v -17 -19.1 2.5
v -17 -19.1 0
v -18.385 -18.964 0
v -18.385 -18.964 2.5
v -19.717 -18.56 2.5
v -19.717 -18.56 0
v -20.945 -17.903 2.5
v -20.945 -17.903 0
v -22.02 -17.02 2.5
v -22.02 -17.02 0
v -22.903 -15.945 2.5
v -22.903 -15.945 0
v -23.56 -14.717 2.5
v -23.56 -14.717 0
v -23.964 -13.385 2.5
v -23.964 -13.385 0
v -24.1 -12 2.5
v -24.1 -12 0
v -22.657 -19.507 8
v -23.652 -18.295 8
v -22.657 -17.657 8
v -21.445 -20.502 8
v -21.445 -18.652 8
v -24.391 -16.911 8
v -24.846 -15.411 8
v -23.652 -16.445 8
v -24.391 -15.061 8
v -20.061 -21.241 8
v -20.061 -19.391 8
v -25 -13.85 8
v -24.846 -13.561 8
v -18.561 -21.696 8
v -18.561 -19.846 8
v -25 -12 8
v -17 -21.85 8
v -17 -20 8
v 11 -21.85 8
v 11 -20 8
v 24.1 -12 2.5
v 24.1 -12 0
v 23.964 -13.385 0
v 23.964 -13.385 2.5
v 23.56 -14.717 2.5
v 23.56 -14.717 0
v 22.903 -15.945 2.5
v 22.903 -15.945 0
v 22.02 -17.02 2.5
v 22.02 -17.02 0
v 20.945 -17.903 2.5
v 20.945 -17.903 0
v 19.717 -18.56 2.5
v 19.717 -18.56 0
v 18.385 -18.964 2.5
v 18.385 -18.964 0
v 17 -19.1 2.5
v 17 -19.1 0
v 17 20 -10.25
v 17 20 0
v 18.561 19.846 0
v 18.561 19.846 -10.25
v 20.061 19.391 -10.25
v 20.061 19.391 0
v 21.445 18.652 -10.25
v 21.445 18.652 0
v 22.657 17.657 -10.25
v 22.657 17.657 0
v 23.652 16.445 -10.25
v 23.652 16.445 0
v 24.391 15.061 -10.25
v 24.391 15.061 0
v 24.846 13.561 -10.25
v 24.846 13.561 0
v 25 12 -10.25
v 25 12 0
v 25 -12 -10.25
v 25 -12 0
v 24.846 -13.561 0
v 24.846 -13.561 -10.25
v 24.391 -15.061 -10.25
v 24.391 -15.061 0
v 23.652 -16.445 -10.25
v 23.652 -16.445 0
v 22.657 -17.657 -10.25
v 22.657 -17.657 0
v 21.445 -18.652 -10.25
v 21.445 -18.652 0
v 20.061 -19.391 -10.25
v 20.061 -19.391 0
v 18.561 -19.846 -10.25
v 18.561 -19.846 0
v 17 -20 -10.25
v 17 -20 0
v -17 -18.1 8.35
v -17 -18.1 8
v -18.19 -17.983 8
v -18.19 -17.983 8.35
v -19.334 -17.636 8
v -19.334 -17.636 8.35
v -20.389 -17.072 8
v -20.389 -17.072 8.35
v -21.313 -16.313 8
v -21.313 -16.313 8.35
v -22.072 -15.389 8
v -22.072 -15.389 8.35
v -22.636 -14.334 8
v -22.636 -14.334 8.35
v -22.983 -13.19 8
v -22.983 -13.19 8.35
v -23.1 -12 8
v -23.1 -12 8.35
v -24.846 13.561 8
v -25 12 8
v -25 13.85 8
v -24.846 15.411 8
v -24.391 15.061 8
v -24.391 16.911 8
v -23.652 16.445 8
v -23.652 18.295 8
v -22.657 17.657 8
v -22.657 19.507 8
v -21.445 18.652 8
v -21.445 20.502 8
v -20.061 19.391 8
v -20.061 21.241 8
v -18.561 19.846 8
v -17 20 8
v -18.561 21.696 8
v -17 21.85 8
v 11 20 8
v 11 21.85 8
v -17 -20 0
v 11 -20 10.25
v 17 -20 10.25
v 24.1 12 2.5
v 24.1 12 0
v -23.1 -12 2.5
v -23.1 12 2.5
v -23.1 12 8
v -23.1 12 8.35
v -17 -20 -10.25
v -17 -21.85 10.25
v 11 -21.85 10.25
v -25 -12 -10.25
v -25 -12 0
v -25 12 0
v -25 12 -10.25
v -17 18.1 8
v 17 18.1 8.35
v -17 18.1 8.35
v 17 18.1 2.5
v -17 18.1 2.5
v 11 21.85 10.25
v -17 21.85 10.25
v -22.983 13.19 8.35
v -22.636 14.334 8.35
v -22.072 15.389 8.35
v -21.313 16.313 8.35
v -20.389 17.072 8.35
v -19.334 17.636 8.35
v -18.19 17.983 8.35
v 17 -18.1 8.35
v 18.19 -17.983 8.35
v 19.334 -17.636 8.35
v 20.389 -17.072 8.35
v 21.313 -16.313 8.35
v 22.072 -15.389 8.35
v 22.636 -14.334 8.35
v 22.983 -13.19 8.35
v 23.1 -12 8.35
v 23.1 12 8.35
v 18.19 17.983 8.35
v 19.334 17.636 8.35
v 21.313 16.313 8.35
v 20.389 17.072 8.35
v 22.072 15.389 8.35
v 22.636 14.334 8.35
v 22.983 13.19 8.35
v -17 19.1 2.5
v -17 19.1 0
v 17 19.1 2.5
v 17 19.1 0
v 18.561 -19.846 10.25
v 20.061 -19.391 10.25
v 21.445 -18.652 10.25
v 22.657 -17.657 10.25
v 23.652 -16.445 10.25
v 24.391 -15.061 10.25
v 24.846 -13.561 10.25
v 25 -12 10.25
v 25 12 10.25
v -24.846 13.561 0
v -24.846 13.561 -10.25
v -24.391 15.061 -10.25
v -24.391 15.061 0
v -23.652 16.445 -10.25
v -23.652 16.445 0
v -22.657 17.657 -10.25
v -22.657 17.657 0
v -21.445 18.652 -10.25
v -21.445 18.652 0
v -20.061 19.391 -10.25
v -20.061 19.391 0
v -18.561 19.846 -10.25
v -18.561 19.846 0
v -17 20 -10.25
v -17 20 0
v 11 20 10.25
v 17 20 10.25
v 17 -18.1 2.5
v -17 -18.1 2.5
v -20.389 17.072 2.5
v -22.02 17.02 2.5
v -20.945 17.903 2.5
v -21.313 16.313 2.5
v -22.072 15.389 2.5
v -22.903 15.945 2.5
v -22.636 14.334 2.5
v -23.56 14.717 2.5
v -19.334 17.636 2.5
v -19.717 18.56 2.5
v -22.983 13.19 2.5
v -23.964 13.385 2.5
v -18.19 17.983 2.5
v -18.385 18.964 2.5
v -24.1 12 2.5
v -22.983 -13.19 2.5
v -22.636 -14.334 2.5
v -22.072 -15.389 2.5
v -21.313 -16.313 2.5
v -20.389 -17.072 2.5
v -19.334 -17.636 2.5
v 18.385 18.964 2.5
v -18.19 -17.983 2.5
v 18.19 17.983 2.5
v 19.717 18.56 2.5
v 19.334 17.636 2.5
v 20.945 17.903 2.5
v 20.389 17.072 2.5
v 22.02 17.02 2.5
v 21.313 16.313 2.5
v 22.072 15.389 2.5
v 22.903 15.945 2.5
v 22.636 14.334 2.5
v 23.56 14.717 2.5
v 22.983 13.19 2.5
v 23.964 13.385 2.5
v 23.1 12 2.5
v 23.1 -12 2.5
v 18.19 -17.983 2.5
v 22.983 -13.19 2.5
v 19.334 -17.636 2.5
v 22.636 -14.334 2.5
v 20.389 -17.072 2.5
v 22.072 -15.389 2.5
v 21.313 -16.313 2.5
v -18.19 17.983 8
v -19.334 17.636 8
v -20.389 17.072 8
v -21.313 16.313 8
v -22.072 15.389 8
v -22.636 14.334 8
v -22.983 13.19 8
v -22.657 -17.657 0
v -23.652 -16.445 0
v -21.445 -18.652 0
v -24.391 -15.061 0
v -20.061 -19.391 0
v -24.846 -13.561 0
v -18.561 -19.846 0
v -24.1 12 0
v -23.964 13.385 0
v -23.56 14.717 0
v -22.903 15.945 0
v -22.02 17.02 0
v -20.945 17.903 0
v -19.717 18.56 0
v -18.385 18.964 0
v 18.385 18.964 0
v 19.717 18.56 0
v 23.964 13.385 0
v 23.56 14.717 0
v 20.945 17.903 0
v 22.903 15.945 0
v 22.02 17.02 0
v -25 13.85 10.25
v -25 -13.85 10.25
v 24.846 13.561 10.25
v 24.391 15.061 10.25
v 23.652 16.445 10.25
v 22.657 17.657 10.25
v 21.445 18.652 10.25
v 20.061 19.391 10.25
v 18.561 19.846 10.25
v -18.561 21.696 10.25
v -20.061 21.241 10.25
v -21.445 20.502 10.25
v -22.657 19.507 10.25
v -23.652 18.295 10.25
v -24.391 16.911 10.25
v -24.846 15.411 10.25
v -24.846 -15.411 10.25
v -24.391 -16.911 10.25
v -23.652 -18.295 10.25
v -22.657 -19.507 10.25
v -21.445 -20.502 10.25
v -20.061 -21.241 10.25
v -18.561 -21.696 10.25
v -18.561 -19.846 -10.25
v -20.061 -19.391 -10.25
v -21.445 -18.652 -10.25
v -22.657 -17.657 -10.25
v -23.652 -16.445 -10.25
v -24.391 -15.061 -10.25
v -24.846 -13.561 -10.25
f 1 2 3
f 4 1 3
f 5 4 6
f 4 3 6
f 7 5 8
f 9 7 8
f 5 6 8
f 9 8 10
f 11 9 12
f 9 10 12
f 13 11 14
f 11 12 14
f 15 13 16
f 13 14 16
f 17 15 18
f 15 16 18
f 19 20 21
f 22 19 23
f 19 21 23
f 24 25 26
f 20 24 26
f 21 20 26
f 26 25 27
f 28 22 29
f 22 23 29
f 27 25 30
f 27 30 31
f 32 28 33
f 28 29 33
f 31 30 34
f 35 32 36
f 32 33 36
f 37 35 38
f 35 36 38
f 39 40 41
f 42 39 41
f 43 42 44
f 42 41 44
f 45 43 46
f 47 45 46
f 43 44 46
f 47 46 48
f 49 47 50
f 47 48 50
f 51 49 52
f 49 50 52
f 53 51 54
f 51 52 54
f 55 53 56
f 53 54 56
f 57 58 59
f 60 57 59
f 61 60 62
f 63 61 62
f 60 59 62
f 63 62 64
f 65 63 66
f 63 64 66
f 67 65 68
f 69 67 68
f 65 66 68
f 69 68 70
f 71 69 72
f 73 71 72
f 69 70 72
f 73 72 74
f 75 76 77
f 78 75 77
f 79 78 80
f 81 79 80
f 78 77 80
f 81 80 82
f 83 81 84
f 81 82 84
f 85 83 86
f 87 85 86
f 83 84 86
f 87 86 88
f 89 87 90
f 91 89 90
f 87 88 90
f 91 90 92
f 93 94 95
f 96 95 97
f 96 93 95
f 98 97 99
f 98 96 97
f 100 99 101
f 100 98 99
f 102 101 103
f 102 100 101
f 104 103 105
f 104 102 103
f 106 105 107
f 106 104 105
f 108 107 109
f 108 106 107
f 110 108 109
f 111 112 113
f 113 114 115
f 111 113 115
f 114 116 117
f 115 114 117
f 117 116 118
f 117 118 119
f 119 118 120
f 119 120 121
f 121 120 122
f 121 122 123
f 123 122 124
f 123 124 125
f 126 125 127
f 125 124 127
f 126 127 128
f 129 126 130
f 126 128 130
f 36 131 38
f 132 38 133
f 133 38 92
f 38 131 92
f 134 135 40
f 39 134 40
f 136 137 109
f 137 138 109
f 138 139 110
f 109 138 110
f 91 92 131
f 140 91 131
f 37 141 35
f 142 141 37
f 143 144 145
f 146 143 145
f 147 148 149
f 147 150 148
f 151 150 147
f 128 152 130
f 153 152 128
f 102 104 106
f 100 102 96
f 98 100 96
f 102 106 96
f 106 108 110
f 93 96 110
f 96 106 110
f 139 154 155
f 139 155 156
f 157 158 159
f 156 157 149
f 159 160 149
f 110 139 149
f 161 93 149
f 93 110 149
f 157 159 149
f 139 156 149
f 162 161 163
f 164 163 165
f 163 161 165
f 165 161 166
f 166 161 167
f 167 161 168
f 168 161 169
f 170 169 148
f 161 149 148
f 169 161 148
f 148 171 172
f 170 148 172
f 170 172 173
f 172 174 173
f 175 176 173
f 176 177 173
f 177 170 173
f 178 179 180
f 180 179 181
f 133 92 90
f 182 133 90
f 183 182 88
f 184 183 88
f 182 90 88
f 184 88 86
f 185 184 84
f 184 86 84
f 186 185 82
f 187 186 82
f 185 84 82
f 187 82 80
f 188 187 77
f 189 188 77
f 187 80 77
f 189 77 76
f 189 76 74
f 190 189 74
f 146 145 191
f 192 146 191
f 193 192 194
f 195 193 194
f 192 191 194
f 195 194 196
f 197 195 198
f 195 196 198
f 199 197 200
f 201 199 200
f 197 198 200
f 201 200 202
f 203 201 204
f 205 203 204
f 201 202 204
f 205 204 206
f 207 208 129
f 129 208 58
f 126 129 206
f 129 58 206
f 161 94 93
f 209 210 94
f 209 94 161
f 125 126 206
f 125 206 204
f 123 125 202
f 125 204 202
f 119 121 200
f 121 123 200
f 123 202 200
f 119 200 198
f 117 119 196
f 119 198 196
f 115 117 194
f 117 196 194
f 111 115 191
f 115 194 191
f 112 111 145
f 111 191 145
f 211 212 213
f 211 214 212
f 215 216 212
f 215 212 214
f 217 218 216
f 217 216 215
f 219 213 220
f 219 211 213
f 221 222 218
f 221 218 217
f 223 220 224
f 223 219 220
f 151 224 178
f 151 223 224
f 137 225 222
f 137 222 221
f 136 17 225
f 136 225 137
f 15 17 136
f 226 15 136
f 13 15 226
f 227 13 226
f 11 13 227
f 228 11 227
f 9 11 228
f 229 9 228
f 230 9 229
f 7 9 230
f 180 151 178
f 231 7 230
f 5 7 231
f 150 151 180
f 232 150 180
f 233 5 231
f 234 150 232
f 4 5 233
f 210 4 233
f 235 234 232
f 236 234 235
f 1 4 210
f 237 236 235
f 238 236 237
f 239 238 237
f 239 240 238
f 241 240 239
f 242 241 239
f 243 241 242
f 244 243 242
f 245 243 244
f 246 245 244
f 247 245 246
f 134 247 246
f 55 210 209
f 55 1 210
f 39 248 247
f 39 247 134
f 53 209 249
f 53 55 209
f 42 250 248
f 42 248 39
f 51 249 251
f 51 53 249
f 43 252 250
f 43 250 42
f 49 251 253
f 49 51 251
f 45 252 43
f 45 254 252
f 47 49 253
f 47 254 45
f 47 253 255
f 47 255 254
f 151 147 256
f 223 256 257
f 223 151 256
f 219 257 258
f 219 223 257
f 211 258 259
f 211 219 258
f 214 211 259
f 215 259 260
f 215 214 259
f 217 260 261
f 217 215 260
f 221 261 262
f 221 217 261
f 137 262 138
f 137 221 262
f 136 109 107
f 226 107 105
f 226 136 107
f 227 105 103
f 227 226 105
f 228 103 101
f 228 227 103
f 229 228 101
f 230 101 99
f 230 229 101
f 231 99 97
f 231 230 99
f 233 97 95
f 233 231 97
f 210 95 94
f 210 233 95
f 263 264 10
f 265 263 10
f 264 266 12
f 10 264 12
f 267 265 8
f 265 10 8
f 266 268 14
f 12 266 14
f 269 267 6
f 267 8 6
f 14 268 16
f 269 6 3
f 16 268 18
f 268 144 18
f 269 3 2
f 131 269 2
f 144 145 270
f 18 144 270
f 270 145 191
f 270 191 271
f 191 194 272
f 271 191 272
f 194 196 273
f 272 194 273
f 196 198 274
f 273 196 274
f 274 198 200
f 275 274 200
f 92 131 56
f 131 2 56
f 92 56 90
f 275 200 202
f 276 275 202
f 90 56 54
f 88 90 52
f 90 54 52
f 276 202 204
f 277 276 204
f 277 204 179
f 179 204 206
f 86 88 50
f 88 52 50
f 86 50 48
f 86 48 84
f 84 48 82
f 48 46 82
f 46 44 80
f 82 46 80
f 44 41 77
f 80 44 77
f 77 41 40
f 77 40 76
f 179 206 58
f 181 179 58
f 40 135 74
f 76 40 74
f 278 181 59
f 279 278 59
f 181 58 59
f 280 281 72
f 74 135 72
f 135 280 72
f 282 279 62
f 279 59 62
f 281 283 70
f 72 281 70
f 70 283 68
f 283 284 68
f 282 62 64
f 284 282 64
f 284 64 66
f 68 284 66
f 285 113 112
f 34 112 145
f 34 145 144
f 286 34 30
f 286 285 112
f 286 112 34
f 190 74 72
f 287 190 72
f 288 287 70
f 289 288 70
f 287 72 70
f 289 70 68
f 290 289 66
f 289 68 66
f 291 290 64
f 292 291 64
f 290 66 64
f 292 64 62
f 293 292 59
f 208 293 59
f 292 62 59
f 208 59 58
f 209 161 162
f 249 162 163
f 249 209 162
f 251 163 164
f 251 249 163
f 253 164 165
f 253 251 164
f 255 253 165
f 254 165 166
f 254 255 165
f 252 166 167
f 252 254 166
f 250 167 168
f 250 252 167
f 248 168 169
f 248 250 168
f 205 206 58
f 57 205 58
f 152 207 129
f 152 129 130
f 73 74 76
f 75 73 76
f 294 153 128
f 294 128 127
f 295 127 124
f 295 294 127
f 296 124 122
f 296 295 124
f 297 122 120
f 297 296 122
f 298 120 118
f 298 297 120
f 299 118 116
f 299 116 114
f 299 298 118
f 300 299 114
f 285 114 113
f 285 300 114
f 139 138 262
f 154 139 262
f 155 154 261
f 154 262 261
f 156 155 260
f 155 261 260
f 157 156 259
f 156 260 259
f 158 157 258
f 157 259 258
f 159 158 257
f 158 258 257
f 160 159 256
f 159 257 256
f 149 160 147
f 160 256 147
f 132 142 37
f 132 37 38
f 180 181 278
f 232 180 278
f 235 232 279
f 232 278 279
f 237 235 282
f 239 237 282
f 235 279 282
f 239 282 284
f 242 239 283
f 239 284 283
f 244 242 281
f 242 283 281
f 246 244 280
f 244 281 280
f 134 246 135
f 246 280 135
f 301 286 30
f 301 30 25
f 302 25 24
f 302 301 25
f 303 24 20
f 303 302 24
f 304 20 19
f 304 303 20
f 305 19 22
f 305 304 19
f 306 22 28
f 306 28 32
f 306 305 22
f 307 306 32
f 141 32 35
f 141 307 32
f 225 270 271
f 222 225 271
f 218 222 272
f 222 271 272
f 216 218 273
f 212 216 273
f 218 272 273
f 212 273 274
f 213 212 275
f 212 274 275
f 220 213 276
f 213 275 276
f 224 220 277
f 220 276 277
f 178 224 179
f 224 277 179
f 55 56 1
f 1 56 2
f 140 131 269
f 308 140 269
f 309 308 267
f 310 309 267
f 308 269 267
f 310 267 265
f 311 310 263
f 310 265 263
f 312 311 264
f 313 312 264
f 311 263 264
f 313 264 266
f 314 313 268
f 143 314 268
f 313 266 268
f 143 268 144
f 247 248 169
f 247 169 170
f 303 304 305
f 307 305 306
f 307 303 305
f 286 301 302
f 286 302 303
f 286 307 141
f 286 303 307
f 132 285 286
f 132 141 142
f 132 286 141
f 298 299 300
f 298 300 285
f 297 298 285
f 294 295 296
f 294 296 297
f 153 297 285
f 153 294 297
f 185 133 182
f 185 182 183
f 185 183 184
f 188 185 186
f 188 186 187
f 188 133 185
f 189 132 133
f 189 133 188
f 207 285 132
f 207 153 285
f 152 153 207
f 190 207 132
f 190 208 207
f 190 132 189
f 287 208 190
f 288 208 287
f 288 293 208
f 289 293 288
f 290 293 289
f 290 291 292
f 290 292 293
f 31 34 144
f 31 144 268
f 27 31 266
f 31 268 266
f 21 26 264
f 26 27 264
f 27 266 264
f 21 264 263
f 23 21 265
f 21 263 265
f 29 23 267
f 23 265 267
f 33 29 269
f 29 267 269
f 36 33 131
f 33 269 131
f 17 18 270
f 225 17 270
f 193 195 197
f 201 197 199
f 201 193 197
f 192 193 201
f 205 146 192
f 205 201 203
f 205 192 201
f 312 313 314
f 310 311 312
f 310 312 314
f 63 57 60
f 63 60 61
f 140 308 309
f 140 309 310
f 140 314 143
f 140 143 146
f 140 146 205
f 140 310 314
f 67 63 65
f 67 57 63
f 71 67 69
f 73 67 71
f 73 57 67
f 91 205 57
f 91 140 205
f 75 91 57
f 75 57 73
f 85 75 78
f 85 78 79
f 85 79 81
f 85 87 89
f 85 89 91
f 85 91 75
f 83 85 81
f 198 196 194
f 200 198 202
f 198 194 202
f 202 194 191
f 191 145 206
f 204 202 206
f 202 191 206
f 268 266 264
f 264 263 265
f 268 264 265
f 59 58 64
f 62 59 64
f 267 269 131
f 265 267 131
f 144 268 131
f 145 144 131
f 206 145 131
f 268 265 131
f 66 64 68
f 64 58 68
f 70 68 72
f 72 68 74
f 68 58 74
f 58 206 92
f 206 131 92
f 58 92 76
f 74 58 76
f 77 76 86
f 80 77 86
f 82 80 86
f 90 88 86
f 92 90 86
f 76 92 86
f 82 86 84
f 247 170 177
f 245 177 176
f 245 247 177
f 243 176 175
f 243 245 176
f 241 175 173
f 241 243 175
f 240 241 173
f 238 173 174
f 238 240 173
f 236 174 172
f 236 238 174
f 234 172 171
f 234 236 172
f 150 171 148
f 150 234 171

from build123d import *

# Parameters (mm, degrees)
F1_DEPTH     = 10.25
F3_DEPTH     = 2.25
F5_DEPTH     = 10.25
F6_T         = 1.9
F6_T3_DEPTH  = 31.8
F6_T5_DEPTH  = 6.05
F6_T8_ANGLE  = 90.000000001
F6_T10_ANGLE = 90.000000001
F8_DEPTH     = 2.5


# Not quite as in the source:
# - a shell that OpenCascade refuses in one call is made with other operations: the cavity is built on its own and cut out


with BuildPart() as f1:
    # F0 (on Top) → F1 (new body)
    with BuildSketch(Plane.XY):
        with BuildLine():
            Line((17, 20), (-17, 20))
            ThreePointArc((-17, 20), (-22.6568542495, 17.6568542495), (-25, 12))
            Line((-25, 12), (-25, -12))
            ThreePointArc((-25, -12), (-22.6568542495, -17.6568542495), (-17, -20))
            Line((-17, -20), (17, -20))
            ThreePointArc((17, -20), (22.6568542495, -17.6568542495), (25, -12))
            Line((25, -12), (25, 12))
            ThreePointArc((25, 12), (22.6568542495, 17.6568542495), (17, 20))
        make_face()
    extrude(amount=F1_DEPTH)

    # F2 (on face) → F3 (join)
    with BuildSketch(Plane.XY.offset(10.25)):
        with BuildLine():
            Line((11, 21.85), (-17, 21.85))
            ThreePointArc((-17, 21.85), (-22.6568542495, 19.5068542495), (-25, 13.85))
            Line((-25, 13.85), (-25, 12))
            ThreePointArc((-25, 12), (-22.6568542495, 17.6568542495), (-17, 20))
            Line((-17, 20), (11, 20))
            Line((11, 20), (11, 21.85))
        make_face()
        with BuildLine():
            Line((11, -21.85), (11, -20))
            Line((11, -20), (-17, -20))
            ThreePointArc((-17, -20), (-22.6568542495, -17.6568542495), (-25, -12))
            Line((-25, -12), (-25, -13.85))
            ThreePointArc((-25, -13.85), (-22.6568542495, -19.5068542495), (-17, -21.85))
            Line((-17, -21.85), (11, -21.85))
        make_face()
    extrude(amount=-F3_DEPTH)

    # F6: shell of thickness 1.9, made by hand


with BuildPart() as f5:
    # F4 (on face) → F5 (new body)
    with BuildSketch(Plane(origin=(0, 0, 0), x_dir=(1, 0, 0), z_dir=(0, 0, -1))):
        with BuildLine():
            Line((17, 20), (-17, 20))
            ThreePointArc((-17, 20), (-22.6568542495, 17.6568542495), (-25, 12))
            Line((-25, 12), (-25, -12))
            ThreePointArc((-25, -12), (-22.6568542495, -17.6568542495), (-17, -20))
            Line((-17, -20), (17, -20))
            ThreePointArc((17, -20), (22.6568542495, -17.6568542495), (25, -12))
            Line((25, -12), (25, 12))
            ThreePointArc((25, 12), (22.6568542495, 17.6568542495), (17, 20))
        make_face()
    extrude(amount=F5_DEPTH)


with BuildPart() as f6_core1:
    # F6_t2: copy of F1
    add(f1.part)

    # the walls: a layer under each face that stays
    f6_faces = [f6_core1.faces().sort_by_distance(p)[0] for p in [
        (0, 20, 5.125),
        (22.6568542495, 17.6568542495, 5.125),
        (25, 0, 5.125),
        (22.6568542495, -17.6568542495, 5.125),
        (0, -20, 5.125),
        (-22.6568542495, -17.6568542495, 4),
        (-25, 0, 5.125),
        (-22.6568542495, -19.5068542495, 9.125),
        (-3, -21.85, 9.125),
        (-22.6568542495, 19.5068542495, 9.125),
        (-3, 21.85, 9.125),
        (-19, -20.2083333333, 8),
        (11, -20.925, 9.125),
        (0, 0, 10.25),
        (11, 20.925, 9.125),
        (-19, 20.2083333333, 8),
        (-22.6568542495, 17.6568542495, 4),
    ]]
    thicken(f6_faces, amount=-F6_T, mode=Mode.SUBTRACT)

    # F6_s4 → F6_t3 (cut)
    with BuildSketch(Plane.YZ.offset(-18.9)):
        Polygon((20.019, 7.981), (18.1, 8), (18.1, 9.9), (20, 9.9), align=None)
        Polygon((-20.019, 7.981), (-18.1, 8), (-18.1, 9.9), (-20, 9.9), align=None)
    extrude(amount=F6_T3_DEPTH, mode=Mode.SUBTRACT)

    # F6_s6 → F6_t5 (cut)
    with BuildSketch(Plane.XY.offset(6.1)):
        Polygon((11.019, 20.019), (11, 18.1), (9.1, 18.1), (9.1, 20), align=None)
        Polygon((11.019, -20.019), (11, -18.1), (9.1, -18.1), (9.1, -20), align=None)
    extrude(amount=F6_T5_DEPTH, mode=Mode.SUBTRACT)

    # F6_s7 → F6_t8 (revolve, cut)
    with BuildSketch(Plane.YZ.offset(-17)):
        Polygon((-20.019, 7.981), (-18.1, 8), (-18.1, 9.9), (-20, 9.9), align=None)
    revolve(axis=Axis((-17, -12, 8), (0, 0, -1)), revolution_arc=F6_T8_ANGLE, mode=Mode.SUBTRACT)

    # F6_s9 → F6_t10 (revolve, cut)
    with BuildSketch(Plane.XZ.offset(-12)):
        Polygon((-25.019, 7.981), (-25, 9.9), (-23.1, 9.9), (-23.1, 8), align=None)
    revolve(axis=Axis((-17, 12, 8), (0, 0, -1)), revolution_arc=F6_T10_ANGLE, mode=Mode.SUBTRACT)


with BuildPart() as f1_1:
    add(f1.part)

    # what is left inside the walls is the cavity
    f6_cavity = [f6_core1.part.solids().sort_by_distance(p)[0] for p in [
        (0, -6.033333, 8.331),
    ]]
    add(f6_cavity, mode=Mode.SUBTRACT)

    # F7 (on face) → F8 (cut)
    with BuildSketch(Plane(origin=(0, 0, 0), x_dir=(1, 0, 0), z_dir=(0, 0, -1))):
        with BuildLine():
            ThreePointArc((-17, 19.1), (-22.0204581464, 17.0204581464), (-24.1, 12))
            Line((-24.1, 12), (-24.1, -12))
            ThreePointArc((-24.1, -12), (-22.0204581464, -17.0204581464), (-17, -19.1))
            Line((-17, -19.1), (17, -19.1))
            ThreePointArc((17, -19.1), (22.0204581464, -17.0204581464), (24.1, -12))
            Line((24.1, -12), (24.1, 12))
            ThreePointArc((24.1, 12), (22.0204581464, 17.0204581464), (17, 19.1))
            Line((17, 19.1), (-17, 19.1))
        make_face()
        with BuildLine():
            Line((-23.1, -12), (-23.1, 12))
            ThreePointArc((-23.1, 12), (-21.3133513652, 16.3133513652), (-17, 18.1))
            Line((-17, 18.1), (17, 18.1))
            ThreePointArc((17, 18.1), (21.3133513652, 16.3133513652), (23.1, 12))
            Line((23.1, 12), (23.1, -12))
            ThreePointArc((23.1, -12), (21.3133513652, -16.3133513652), (17, -18.1))
            Line((17, -18.1), (-17, -18.1))
            ThreePointArc((-17, -18.1), (-21.3133513652, -16.3133513652), (-23.1, -12))
        make_face(mode=Mode.SUBTRACT)
    extrude(amount=-F8_DEPTH, mode=Mode.SUBTRACT)


solid = Compound([f5.part, f1_1.part])
